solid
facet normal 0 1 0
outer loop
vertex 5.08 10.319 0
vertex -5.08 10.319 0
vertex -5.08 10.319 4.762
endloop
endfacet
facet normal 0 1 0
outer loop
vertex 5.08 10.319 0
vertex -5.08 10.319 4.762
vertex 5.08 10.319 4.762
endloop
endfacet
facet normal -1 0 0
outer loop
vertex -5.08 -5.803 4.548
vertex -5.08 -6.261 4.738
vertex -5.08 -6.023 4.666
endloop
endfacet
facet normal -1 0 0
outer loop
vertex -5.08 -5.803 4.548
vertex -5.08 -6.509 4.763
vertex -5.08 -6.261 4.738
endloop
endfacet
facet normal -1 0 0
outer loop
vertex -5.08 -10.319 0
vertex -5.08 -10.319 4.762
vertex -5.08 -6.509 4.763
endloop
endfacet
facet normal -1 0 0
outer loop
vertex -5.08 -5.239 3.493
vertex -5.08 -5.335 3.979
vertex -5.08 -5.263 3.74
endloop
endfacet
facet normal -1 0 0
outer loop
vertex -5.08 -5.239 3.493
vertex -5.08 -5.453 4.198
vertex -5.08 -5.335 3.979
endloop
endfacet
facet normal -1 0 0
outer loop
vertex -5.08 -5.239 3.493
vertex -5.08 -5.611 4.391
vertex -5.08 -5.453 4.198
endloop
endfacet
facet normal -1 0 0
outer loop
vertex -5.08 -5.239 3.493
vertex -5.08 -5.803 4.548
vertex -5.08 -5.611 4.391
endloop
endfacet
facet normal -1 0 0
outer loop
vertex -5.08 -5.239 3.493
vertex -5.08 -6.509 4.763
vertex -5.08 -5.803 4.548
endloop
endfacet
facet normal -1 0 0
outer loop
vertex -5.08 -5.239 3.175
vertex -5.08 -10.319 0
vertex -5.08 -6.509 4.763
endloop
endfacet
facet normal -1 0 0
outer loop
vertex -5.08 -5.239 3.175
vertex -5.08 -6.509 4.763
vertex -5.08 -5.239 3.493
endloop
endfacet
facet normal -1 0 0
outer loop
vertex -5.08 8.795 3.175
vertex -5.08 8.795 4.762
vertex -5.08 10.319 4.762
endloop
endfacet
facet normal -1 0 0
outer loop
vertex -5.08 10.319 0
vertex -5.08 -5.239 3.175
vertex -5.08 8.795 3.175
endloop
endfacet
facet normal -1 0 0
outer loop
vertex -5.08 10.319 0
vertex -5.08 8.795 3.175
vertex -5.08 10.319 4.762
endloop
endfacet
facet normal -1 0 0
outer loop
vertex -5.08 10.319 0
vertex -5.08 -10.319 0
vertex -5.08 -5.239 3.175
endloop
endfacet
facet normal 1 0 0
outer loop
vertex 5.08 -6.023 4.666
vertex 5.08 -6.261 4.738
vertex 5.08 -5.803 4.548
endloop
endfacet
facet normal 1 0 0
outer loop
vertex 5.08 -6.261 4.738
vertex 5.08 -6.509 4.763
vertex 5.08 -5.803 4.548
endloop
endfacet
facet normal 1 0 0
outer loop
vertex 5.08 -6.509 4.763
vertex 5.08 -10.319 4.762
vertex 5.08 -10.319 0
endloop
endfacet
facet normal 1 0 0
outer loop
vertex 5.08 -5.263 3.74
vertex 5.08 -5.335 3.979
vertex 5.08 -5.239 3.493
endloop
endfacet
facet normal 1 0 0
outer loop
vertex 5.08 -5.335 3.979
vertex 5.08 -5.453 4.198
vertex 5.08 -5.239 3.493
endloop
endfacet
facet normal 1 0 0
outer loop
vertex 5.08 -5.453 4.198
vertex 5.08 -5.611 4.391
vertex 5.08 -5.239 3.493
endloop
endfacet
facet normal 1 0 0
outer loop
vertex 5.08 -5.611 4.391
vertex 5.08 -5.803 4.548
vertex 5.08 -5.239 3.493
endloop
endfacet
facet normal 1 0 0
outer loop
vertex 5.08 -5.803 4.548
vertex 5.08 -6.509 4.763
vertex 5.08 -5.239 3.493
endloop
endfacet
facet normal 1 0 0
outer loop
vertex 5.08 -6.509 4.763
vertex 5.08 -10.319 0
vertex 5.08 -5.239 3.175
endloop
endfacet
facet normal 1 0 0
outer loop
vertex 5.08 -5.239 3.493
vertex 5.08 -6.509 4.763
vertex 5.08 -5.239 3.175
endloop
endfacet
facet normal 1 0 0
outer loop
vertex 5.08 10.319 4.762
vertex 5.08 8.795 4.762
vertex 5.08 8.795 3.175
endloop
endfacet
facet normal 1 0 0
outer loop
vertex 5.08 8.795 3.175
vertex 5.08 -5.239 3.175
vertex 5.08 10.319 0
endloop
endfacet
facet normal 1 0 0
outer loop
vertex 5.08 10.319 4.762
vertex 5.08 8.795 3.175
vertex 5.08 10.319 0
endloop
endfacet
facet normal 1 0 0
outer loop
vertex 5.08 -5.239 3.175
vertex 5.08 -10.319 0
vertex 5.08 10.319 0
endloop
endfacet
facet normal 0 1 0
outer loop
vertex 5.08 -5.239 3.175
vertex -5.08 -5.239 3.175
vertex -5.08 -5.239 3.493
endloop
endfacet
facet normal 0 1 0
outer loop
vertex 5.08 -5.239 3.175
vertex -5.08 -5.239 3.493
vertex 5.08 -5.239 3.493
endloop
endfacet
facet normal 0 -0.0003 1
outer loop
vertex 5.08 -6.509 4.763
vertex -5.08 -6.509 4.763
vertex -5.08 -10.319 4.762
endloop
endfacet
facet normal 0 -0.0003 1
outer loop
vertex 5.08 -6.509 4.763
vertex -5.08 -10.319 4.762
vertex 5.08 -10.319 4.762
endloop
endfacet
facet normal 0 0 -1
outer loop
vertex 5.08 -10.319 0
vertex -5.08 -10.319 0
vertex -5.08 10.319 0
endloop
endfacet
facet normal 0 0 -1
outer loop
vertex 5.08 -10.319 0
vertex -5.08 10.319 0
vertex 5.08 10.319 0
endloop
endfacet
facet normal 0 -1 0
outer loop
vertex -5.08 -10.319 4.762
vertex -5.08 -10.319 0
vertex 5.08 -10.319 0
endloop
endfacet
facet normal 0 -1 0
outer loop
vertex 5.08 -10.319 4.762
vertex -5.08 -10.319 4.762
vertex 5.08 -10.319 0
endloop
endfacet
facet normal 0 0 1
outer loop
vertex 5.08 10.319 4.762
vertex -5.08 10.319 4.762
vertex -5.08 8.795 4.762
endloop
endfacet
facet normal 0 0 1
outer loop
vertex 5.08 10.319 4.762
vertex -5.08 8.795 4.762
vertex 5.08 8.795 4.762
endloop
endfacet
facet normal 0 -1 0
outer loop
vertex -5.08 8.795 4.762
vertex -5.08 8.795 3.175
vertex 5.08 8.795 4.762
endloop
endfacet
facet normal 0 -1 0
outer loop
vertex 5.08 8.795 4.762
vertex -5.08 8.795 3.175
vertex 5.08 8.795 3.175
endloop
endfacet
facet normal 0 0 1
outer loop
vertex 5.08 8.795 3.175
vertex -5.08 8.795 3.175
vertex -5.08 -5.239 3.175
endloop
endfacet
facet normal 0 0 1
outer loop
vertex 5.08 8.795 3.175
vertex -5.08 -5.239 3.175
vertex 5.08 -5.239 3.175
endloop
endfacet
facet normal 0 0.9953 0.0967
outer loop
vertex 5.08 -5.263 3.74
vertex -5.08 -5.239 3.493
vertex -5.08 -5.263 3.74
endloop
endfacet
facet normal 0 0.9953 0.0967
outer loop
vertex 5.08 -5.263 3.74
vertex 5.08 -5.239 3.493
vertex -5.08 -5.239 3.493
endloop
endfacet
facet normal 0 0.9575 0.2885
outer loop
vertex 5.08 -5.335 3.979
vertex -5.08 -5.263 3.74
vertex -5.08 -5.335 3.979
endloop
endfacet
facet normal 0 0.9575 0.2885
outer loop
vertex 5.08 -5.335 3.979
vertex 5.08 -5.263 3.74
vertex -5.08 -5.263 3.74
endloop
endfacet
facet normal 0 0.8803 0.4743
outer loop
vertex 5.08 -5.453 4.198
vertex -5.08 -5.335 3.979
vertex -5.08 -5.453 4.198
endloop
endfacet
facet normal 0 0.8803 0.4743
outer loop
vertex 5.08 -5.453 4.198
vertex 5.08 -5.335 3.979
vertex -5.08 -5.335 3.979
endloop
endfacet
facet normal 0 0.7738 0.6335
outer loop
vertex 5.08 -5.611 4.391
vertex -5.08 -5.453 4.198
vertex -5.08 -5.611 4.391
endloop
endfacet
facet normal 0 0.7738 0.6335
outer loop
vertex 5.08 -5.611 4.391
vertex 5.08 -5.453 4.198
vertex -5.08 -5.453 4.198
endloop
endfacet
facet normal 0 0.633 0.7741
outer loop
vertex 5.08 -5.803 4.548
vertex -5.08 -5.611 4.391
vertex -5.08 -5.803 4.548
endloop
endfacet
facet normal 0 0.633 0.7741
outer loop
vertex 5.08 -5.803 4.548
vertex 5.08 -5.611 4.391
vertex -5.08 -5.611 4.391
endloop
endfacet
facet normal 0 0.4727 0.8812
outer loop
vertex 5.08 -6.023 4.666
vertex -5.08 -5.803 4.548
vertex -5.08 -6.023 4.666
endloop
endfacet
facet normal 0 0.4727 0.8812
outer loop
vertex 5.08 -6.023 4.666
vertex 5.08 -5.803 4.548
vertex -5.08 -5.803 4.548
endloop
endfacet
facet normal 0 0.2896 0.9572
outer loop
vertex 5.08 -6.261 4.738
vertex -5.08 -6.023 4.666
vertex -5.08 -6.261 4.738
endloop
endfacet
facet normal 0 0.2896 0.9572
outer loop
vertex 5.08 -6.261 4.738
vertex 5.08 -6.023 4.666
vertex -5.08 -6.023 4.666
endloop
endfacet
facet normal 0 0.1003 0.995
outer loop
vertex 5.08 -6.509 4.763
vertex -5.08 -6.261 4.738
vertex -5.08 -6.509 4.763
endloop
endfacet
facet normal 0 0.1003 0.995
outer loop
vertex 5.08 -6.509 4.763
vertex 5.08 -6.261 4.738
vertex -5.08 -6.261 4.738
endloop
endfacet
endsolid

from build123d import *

# Parameters (mm, degrees)
F0_W     = 10.16
F0_H     = 14.0335
F1_DEPTH = 3.175
F0_H_2   = 5.08
F0_H_3   = 1.524
F2_DEPTH = 4.7625
F3_R     = 1.27


with BuildPart() as f1:
    # F0 (on Top) → F1 (new body)
    with BuildSketch(Plane.XY):
        with Locations((0, 1.778)):
            Rectangle(F0_W, F0_H)
    extrude(amount=F1_DEPTH)

    # F0 (on Top) → F2 (join)
    with BuildSketch(Plane.XY):
        with Locations((0, -7.77875)):
            Rectangle(F0_W, F0_H_2)
        with Locations((0, 9.55675)):
            Rectangle(F0_W, F0_H_3)
    extrude(amount=F2_DEPTH)

    # F3
    f3_edges = [f1.edges().sort_by_distance(p)[0] for p in [
        (0, -5.23875, 4.7625),
    ]]
    fillet(f3_edges, radius=F3_R)


solid = f1.part
